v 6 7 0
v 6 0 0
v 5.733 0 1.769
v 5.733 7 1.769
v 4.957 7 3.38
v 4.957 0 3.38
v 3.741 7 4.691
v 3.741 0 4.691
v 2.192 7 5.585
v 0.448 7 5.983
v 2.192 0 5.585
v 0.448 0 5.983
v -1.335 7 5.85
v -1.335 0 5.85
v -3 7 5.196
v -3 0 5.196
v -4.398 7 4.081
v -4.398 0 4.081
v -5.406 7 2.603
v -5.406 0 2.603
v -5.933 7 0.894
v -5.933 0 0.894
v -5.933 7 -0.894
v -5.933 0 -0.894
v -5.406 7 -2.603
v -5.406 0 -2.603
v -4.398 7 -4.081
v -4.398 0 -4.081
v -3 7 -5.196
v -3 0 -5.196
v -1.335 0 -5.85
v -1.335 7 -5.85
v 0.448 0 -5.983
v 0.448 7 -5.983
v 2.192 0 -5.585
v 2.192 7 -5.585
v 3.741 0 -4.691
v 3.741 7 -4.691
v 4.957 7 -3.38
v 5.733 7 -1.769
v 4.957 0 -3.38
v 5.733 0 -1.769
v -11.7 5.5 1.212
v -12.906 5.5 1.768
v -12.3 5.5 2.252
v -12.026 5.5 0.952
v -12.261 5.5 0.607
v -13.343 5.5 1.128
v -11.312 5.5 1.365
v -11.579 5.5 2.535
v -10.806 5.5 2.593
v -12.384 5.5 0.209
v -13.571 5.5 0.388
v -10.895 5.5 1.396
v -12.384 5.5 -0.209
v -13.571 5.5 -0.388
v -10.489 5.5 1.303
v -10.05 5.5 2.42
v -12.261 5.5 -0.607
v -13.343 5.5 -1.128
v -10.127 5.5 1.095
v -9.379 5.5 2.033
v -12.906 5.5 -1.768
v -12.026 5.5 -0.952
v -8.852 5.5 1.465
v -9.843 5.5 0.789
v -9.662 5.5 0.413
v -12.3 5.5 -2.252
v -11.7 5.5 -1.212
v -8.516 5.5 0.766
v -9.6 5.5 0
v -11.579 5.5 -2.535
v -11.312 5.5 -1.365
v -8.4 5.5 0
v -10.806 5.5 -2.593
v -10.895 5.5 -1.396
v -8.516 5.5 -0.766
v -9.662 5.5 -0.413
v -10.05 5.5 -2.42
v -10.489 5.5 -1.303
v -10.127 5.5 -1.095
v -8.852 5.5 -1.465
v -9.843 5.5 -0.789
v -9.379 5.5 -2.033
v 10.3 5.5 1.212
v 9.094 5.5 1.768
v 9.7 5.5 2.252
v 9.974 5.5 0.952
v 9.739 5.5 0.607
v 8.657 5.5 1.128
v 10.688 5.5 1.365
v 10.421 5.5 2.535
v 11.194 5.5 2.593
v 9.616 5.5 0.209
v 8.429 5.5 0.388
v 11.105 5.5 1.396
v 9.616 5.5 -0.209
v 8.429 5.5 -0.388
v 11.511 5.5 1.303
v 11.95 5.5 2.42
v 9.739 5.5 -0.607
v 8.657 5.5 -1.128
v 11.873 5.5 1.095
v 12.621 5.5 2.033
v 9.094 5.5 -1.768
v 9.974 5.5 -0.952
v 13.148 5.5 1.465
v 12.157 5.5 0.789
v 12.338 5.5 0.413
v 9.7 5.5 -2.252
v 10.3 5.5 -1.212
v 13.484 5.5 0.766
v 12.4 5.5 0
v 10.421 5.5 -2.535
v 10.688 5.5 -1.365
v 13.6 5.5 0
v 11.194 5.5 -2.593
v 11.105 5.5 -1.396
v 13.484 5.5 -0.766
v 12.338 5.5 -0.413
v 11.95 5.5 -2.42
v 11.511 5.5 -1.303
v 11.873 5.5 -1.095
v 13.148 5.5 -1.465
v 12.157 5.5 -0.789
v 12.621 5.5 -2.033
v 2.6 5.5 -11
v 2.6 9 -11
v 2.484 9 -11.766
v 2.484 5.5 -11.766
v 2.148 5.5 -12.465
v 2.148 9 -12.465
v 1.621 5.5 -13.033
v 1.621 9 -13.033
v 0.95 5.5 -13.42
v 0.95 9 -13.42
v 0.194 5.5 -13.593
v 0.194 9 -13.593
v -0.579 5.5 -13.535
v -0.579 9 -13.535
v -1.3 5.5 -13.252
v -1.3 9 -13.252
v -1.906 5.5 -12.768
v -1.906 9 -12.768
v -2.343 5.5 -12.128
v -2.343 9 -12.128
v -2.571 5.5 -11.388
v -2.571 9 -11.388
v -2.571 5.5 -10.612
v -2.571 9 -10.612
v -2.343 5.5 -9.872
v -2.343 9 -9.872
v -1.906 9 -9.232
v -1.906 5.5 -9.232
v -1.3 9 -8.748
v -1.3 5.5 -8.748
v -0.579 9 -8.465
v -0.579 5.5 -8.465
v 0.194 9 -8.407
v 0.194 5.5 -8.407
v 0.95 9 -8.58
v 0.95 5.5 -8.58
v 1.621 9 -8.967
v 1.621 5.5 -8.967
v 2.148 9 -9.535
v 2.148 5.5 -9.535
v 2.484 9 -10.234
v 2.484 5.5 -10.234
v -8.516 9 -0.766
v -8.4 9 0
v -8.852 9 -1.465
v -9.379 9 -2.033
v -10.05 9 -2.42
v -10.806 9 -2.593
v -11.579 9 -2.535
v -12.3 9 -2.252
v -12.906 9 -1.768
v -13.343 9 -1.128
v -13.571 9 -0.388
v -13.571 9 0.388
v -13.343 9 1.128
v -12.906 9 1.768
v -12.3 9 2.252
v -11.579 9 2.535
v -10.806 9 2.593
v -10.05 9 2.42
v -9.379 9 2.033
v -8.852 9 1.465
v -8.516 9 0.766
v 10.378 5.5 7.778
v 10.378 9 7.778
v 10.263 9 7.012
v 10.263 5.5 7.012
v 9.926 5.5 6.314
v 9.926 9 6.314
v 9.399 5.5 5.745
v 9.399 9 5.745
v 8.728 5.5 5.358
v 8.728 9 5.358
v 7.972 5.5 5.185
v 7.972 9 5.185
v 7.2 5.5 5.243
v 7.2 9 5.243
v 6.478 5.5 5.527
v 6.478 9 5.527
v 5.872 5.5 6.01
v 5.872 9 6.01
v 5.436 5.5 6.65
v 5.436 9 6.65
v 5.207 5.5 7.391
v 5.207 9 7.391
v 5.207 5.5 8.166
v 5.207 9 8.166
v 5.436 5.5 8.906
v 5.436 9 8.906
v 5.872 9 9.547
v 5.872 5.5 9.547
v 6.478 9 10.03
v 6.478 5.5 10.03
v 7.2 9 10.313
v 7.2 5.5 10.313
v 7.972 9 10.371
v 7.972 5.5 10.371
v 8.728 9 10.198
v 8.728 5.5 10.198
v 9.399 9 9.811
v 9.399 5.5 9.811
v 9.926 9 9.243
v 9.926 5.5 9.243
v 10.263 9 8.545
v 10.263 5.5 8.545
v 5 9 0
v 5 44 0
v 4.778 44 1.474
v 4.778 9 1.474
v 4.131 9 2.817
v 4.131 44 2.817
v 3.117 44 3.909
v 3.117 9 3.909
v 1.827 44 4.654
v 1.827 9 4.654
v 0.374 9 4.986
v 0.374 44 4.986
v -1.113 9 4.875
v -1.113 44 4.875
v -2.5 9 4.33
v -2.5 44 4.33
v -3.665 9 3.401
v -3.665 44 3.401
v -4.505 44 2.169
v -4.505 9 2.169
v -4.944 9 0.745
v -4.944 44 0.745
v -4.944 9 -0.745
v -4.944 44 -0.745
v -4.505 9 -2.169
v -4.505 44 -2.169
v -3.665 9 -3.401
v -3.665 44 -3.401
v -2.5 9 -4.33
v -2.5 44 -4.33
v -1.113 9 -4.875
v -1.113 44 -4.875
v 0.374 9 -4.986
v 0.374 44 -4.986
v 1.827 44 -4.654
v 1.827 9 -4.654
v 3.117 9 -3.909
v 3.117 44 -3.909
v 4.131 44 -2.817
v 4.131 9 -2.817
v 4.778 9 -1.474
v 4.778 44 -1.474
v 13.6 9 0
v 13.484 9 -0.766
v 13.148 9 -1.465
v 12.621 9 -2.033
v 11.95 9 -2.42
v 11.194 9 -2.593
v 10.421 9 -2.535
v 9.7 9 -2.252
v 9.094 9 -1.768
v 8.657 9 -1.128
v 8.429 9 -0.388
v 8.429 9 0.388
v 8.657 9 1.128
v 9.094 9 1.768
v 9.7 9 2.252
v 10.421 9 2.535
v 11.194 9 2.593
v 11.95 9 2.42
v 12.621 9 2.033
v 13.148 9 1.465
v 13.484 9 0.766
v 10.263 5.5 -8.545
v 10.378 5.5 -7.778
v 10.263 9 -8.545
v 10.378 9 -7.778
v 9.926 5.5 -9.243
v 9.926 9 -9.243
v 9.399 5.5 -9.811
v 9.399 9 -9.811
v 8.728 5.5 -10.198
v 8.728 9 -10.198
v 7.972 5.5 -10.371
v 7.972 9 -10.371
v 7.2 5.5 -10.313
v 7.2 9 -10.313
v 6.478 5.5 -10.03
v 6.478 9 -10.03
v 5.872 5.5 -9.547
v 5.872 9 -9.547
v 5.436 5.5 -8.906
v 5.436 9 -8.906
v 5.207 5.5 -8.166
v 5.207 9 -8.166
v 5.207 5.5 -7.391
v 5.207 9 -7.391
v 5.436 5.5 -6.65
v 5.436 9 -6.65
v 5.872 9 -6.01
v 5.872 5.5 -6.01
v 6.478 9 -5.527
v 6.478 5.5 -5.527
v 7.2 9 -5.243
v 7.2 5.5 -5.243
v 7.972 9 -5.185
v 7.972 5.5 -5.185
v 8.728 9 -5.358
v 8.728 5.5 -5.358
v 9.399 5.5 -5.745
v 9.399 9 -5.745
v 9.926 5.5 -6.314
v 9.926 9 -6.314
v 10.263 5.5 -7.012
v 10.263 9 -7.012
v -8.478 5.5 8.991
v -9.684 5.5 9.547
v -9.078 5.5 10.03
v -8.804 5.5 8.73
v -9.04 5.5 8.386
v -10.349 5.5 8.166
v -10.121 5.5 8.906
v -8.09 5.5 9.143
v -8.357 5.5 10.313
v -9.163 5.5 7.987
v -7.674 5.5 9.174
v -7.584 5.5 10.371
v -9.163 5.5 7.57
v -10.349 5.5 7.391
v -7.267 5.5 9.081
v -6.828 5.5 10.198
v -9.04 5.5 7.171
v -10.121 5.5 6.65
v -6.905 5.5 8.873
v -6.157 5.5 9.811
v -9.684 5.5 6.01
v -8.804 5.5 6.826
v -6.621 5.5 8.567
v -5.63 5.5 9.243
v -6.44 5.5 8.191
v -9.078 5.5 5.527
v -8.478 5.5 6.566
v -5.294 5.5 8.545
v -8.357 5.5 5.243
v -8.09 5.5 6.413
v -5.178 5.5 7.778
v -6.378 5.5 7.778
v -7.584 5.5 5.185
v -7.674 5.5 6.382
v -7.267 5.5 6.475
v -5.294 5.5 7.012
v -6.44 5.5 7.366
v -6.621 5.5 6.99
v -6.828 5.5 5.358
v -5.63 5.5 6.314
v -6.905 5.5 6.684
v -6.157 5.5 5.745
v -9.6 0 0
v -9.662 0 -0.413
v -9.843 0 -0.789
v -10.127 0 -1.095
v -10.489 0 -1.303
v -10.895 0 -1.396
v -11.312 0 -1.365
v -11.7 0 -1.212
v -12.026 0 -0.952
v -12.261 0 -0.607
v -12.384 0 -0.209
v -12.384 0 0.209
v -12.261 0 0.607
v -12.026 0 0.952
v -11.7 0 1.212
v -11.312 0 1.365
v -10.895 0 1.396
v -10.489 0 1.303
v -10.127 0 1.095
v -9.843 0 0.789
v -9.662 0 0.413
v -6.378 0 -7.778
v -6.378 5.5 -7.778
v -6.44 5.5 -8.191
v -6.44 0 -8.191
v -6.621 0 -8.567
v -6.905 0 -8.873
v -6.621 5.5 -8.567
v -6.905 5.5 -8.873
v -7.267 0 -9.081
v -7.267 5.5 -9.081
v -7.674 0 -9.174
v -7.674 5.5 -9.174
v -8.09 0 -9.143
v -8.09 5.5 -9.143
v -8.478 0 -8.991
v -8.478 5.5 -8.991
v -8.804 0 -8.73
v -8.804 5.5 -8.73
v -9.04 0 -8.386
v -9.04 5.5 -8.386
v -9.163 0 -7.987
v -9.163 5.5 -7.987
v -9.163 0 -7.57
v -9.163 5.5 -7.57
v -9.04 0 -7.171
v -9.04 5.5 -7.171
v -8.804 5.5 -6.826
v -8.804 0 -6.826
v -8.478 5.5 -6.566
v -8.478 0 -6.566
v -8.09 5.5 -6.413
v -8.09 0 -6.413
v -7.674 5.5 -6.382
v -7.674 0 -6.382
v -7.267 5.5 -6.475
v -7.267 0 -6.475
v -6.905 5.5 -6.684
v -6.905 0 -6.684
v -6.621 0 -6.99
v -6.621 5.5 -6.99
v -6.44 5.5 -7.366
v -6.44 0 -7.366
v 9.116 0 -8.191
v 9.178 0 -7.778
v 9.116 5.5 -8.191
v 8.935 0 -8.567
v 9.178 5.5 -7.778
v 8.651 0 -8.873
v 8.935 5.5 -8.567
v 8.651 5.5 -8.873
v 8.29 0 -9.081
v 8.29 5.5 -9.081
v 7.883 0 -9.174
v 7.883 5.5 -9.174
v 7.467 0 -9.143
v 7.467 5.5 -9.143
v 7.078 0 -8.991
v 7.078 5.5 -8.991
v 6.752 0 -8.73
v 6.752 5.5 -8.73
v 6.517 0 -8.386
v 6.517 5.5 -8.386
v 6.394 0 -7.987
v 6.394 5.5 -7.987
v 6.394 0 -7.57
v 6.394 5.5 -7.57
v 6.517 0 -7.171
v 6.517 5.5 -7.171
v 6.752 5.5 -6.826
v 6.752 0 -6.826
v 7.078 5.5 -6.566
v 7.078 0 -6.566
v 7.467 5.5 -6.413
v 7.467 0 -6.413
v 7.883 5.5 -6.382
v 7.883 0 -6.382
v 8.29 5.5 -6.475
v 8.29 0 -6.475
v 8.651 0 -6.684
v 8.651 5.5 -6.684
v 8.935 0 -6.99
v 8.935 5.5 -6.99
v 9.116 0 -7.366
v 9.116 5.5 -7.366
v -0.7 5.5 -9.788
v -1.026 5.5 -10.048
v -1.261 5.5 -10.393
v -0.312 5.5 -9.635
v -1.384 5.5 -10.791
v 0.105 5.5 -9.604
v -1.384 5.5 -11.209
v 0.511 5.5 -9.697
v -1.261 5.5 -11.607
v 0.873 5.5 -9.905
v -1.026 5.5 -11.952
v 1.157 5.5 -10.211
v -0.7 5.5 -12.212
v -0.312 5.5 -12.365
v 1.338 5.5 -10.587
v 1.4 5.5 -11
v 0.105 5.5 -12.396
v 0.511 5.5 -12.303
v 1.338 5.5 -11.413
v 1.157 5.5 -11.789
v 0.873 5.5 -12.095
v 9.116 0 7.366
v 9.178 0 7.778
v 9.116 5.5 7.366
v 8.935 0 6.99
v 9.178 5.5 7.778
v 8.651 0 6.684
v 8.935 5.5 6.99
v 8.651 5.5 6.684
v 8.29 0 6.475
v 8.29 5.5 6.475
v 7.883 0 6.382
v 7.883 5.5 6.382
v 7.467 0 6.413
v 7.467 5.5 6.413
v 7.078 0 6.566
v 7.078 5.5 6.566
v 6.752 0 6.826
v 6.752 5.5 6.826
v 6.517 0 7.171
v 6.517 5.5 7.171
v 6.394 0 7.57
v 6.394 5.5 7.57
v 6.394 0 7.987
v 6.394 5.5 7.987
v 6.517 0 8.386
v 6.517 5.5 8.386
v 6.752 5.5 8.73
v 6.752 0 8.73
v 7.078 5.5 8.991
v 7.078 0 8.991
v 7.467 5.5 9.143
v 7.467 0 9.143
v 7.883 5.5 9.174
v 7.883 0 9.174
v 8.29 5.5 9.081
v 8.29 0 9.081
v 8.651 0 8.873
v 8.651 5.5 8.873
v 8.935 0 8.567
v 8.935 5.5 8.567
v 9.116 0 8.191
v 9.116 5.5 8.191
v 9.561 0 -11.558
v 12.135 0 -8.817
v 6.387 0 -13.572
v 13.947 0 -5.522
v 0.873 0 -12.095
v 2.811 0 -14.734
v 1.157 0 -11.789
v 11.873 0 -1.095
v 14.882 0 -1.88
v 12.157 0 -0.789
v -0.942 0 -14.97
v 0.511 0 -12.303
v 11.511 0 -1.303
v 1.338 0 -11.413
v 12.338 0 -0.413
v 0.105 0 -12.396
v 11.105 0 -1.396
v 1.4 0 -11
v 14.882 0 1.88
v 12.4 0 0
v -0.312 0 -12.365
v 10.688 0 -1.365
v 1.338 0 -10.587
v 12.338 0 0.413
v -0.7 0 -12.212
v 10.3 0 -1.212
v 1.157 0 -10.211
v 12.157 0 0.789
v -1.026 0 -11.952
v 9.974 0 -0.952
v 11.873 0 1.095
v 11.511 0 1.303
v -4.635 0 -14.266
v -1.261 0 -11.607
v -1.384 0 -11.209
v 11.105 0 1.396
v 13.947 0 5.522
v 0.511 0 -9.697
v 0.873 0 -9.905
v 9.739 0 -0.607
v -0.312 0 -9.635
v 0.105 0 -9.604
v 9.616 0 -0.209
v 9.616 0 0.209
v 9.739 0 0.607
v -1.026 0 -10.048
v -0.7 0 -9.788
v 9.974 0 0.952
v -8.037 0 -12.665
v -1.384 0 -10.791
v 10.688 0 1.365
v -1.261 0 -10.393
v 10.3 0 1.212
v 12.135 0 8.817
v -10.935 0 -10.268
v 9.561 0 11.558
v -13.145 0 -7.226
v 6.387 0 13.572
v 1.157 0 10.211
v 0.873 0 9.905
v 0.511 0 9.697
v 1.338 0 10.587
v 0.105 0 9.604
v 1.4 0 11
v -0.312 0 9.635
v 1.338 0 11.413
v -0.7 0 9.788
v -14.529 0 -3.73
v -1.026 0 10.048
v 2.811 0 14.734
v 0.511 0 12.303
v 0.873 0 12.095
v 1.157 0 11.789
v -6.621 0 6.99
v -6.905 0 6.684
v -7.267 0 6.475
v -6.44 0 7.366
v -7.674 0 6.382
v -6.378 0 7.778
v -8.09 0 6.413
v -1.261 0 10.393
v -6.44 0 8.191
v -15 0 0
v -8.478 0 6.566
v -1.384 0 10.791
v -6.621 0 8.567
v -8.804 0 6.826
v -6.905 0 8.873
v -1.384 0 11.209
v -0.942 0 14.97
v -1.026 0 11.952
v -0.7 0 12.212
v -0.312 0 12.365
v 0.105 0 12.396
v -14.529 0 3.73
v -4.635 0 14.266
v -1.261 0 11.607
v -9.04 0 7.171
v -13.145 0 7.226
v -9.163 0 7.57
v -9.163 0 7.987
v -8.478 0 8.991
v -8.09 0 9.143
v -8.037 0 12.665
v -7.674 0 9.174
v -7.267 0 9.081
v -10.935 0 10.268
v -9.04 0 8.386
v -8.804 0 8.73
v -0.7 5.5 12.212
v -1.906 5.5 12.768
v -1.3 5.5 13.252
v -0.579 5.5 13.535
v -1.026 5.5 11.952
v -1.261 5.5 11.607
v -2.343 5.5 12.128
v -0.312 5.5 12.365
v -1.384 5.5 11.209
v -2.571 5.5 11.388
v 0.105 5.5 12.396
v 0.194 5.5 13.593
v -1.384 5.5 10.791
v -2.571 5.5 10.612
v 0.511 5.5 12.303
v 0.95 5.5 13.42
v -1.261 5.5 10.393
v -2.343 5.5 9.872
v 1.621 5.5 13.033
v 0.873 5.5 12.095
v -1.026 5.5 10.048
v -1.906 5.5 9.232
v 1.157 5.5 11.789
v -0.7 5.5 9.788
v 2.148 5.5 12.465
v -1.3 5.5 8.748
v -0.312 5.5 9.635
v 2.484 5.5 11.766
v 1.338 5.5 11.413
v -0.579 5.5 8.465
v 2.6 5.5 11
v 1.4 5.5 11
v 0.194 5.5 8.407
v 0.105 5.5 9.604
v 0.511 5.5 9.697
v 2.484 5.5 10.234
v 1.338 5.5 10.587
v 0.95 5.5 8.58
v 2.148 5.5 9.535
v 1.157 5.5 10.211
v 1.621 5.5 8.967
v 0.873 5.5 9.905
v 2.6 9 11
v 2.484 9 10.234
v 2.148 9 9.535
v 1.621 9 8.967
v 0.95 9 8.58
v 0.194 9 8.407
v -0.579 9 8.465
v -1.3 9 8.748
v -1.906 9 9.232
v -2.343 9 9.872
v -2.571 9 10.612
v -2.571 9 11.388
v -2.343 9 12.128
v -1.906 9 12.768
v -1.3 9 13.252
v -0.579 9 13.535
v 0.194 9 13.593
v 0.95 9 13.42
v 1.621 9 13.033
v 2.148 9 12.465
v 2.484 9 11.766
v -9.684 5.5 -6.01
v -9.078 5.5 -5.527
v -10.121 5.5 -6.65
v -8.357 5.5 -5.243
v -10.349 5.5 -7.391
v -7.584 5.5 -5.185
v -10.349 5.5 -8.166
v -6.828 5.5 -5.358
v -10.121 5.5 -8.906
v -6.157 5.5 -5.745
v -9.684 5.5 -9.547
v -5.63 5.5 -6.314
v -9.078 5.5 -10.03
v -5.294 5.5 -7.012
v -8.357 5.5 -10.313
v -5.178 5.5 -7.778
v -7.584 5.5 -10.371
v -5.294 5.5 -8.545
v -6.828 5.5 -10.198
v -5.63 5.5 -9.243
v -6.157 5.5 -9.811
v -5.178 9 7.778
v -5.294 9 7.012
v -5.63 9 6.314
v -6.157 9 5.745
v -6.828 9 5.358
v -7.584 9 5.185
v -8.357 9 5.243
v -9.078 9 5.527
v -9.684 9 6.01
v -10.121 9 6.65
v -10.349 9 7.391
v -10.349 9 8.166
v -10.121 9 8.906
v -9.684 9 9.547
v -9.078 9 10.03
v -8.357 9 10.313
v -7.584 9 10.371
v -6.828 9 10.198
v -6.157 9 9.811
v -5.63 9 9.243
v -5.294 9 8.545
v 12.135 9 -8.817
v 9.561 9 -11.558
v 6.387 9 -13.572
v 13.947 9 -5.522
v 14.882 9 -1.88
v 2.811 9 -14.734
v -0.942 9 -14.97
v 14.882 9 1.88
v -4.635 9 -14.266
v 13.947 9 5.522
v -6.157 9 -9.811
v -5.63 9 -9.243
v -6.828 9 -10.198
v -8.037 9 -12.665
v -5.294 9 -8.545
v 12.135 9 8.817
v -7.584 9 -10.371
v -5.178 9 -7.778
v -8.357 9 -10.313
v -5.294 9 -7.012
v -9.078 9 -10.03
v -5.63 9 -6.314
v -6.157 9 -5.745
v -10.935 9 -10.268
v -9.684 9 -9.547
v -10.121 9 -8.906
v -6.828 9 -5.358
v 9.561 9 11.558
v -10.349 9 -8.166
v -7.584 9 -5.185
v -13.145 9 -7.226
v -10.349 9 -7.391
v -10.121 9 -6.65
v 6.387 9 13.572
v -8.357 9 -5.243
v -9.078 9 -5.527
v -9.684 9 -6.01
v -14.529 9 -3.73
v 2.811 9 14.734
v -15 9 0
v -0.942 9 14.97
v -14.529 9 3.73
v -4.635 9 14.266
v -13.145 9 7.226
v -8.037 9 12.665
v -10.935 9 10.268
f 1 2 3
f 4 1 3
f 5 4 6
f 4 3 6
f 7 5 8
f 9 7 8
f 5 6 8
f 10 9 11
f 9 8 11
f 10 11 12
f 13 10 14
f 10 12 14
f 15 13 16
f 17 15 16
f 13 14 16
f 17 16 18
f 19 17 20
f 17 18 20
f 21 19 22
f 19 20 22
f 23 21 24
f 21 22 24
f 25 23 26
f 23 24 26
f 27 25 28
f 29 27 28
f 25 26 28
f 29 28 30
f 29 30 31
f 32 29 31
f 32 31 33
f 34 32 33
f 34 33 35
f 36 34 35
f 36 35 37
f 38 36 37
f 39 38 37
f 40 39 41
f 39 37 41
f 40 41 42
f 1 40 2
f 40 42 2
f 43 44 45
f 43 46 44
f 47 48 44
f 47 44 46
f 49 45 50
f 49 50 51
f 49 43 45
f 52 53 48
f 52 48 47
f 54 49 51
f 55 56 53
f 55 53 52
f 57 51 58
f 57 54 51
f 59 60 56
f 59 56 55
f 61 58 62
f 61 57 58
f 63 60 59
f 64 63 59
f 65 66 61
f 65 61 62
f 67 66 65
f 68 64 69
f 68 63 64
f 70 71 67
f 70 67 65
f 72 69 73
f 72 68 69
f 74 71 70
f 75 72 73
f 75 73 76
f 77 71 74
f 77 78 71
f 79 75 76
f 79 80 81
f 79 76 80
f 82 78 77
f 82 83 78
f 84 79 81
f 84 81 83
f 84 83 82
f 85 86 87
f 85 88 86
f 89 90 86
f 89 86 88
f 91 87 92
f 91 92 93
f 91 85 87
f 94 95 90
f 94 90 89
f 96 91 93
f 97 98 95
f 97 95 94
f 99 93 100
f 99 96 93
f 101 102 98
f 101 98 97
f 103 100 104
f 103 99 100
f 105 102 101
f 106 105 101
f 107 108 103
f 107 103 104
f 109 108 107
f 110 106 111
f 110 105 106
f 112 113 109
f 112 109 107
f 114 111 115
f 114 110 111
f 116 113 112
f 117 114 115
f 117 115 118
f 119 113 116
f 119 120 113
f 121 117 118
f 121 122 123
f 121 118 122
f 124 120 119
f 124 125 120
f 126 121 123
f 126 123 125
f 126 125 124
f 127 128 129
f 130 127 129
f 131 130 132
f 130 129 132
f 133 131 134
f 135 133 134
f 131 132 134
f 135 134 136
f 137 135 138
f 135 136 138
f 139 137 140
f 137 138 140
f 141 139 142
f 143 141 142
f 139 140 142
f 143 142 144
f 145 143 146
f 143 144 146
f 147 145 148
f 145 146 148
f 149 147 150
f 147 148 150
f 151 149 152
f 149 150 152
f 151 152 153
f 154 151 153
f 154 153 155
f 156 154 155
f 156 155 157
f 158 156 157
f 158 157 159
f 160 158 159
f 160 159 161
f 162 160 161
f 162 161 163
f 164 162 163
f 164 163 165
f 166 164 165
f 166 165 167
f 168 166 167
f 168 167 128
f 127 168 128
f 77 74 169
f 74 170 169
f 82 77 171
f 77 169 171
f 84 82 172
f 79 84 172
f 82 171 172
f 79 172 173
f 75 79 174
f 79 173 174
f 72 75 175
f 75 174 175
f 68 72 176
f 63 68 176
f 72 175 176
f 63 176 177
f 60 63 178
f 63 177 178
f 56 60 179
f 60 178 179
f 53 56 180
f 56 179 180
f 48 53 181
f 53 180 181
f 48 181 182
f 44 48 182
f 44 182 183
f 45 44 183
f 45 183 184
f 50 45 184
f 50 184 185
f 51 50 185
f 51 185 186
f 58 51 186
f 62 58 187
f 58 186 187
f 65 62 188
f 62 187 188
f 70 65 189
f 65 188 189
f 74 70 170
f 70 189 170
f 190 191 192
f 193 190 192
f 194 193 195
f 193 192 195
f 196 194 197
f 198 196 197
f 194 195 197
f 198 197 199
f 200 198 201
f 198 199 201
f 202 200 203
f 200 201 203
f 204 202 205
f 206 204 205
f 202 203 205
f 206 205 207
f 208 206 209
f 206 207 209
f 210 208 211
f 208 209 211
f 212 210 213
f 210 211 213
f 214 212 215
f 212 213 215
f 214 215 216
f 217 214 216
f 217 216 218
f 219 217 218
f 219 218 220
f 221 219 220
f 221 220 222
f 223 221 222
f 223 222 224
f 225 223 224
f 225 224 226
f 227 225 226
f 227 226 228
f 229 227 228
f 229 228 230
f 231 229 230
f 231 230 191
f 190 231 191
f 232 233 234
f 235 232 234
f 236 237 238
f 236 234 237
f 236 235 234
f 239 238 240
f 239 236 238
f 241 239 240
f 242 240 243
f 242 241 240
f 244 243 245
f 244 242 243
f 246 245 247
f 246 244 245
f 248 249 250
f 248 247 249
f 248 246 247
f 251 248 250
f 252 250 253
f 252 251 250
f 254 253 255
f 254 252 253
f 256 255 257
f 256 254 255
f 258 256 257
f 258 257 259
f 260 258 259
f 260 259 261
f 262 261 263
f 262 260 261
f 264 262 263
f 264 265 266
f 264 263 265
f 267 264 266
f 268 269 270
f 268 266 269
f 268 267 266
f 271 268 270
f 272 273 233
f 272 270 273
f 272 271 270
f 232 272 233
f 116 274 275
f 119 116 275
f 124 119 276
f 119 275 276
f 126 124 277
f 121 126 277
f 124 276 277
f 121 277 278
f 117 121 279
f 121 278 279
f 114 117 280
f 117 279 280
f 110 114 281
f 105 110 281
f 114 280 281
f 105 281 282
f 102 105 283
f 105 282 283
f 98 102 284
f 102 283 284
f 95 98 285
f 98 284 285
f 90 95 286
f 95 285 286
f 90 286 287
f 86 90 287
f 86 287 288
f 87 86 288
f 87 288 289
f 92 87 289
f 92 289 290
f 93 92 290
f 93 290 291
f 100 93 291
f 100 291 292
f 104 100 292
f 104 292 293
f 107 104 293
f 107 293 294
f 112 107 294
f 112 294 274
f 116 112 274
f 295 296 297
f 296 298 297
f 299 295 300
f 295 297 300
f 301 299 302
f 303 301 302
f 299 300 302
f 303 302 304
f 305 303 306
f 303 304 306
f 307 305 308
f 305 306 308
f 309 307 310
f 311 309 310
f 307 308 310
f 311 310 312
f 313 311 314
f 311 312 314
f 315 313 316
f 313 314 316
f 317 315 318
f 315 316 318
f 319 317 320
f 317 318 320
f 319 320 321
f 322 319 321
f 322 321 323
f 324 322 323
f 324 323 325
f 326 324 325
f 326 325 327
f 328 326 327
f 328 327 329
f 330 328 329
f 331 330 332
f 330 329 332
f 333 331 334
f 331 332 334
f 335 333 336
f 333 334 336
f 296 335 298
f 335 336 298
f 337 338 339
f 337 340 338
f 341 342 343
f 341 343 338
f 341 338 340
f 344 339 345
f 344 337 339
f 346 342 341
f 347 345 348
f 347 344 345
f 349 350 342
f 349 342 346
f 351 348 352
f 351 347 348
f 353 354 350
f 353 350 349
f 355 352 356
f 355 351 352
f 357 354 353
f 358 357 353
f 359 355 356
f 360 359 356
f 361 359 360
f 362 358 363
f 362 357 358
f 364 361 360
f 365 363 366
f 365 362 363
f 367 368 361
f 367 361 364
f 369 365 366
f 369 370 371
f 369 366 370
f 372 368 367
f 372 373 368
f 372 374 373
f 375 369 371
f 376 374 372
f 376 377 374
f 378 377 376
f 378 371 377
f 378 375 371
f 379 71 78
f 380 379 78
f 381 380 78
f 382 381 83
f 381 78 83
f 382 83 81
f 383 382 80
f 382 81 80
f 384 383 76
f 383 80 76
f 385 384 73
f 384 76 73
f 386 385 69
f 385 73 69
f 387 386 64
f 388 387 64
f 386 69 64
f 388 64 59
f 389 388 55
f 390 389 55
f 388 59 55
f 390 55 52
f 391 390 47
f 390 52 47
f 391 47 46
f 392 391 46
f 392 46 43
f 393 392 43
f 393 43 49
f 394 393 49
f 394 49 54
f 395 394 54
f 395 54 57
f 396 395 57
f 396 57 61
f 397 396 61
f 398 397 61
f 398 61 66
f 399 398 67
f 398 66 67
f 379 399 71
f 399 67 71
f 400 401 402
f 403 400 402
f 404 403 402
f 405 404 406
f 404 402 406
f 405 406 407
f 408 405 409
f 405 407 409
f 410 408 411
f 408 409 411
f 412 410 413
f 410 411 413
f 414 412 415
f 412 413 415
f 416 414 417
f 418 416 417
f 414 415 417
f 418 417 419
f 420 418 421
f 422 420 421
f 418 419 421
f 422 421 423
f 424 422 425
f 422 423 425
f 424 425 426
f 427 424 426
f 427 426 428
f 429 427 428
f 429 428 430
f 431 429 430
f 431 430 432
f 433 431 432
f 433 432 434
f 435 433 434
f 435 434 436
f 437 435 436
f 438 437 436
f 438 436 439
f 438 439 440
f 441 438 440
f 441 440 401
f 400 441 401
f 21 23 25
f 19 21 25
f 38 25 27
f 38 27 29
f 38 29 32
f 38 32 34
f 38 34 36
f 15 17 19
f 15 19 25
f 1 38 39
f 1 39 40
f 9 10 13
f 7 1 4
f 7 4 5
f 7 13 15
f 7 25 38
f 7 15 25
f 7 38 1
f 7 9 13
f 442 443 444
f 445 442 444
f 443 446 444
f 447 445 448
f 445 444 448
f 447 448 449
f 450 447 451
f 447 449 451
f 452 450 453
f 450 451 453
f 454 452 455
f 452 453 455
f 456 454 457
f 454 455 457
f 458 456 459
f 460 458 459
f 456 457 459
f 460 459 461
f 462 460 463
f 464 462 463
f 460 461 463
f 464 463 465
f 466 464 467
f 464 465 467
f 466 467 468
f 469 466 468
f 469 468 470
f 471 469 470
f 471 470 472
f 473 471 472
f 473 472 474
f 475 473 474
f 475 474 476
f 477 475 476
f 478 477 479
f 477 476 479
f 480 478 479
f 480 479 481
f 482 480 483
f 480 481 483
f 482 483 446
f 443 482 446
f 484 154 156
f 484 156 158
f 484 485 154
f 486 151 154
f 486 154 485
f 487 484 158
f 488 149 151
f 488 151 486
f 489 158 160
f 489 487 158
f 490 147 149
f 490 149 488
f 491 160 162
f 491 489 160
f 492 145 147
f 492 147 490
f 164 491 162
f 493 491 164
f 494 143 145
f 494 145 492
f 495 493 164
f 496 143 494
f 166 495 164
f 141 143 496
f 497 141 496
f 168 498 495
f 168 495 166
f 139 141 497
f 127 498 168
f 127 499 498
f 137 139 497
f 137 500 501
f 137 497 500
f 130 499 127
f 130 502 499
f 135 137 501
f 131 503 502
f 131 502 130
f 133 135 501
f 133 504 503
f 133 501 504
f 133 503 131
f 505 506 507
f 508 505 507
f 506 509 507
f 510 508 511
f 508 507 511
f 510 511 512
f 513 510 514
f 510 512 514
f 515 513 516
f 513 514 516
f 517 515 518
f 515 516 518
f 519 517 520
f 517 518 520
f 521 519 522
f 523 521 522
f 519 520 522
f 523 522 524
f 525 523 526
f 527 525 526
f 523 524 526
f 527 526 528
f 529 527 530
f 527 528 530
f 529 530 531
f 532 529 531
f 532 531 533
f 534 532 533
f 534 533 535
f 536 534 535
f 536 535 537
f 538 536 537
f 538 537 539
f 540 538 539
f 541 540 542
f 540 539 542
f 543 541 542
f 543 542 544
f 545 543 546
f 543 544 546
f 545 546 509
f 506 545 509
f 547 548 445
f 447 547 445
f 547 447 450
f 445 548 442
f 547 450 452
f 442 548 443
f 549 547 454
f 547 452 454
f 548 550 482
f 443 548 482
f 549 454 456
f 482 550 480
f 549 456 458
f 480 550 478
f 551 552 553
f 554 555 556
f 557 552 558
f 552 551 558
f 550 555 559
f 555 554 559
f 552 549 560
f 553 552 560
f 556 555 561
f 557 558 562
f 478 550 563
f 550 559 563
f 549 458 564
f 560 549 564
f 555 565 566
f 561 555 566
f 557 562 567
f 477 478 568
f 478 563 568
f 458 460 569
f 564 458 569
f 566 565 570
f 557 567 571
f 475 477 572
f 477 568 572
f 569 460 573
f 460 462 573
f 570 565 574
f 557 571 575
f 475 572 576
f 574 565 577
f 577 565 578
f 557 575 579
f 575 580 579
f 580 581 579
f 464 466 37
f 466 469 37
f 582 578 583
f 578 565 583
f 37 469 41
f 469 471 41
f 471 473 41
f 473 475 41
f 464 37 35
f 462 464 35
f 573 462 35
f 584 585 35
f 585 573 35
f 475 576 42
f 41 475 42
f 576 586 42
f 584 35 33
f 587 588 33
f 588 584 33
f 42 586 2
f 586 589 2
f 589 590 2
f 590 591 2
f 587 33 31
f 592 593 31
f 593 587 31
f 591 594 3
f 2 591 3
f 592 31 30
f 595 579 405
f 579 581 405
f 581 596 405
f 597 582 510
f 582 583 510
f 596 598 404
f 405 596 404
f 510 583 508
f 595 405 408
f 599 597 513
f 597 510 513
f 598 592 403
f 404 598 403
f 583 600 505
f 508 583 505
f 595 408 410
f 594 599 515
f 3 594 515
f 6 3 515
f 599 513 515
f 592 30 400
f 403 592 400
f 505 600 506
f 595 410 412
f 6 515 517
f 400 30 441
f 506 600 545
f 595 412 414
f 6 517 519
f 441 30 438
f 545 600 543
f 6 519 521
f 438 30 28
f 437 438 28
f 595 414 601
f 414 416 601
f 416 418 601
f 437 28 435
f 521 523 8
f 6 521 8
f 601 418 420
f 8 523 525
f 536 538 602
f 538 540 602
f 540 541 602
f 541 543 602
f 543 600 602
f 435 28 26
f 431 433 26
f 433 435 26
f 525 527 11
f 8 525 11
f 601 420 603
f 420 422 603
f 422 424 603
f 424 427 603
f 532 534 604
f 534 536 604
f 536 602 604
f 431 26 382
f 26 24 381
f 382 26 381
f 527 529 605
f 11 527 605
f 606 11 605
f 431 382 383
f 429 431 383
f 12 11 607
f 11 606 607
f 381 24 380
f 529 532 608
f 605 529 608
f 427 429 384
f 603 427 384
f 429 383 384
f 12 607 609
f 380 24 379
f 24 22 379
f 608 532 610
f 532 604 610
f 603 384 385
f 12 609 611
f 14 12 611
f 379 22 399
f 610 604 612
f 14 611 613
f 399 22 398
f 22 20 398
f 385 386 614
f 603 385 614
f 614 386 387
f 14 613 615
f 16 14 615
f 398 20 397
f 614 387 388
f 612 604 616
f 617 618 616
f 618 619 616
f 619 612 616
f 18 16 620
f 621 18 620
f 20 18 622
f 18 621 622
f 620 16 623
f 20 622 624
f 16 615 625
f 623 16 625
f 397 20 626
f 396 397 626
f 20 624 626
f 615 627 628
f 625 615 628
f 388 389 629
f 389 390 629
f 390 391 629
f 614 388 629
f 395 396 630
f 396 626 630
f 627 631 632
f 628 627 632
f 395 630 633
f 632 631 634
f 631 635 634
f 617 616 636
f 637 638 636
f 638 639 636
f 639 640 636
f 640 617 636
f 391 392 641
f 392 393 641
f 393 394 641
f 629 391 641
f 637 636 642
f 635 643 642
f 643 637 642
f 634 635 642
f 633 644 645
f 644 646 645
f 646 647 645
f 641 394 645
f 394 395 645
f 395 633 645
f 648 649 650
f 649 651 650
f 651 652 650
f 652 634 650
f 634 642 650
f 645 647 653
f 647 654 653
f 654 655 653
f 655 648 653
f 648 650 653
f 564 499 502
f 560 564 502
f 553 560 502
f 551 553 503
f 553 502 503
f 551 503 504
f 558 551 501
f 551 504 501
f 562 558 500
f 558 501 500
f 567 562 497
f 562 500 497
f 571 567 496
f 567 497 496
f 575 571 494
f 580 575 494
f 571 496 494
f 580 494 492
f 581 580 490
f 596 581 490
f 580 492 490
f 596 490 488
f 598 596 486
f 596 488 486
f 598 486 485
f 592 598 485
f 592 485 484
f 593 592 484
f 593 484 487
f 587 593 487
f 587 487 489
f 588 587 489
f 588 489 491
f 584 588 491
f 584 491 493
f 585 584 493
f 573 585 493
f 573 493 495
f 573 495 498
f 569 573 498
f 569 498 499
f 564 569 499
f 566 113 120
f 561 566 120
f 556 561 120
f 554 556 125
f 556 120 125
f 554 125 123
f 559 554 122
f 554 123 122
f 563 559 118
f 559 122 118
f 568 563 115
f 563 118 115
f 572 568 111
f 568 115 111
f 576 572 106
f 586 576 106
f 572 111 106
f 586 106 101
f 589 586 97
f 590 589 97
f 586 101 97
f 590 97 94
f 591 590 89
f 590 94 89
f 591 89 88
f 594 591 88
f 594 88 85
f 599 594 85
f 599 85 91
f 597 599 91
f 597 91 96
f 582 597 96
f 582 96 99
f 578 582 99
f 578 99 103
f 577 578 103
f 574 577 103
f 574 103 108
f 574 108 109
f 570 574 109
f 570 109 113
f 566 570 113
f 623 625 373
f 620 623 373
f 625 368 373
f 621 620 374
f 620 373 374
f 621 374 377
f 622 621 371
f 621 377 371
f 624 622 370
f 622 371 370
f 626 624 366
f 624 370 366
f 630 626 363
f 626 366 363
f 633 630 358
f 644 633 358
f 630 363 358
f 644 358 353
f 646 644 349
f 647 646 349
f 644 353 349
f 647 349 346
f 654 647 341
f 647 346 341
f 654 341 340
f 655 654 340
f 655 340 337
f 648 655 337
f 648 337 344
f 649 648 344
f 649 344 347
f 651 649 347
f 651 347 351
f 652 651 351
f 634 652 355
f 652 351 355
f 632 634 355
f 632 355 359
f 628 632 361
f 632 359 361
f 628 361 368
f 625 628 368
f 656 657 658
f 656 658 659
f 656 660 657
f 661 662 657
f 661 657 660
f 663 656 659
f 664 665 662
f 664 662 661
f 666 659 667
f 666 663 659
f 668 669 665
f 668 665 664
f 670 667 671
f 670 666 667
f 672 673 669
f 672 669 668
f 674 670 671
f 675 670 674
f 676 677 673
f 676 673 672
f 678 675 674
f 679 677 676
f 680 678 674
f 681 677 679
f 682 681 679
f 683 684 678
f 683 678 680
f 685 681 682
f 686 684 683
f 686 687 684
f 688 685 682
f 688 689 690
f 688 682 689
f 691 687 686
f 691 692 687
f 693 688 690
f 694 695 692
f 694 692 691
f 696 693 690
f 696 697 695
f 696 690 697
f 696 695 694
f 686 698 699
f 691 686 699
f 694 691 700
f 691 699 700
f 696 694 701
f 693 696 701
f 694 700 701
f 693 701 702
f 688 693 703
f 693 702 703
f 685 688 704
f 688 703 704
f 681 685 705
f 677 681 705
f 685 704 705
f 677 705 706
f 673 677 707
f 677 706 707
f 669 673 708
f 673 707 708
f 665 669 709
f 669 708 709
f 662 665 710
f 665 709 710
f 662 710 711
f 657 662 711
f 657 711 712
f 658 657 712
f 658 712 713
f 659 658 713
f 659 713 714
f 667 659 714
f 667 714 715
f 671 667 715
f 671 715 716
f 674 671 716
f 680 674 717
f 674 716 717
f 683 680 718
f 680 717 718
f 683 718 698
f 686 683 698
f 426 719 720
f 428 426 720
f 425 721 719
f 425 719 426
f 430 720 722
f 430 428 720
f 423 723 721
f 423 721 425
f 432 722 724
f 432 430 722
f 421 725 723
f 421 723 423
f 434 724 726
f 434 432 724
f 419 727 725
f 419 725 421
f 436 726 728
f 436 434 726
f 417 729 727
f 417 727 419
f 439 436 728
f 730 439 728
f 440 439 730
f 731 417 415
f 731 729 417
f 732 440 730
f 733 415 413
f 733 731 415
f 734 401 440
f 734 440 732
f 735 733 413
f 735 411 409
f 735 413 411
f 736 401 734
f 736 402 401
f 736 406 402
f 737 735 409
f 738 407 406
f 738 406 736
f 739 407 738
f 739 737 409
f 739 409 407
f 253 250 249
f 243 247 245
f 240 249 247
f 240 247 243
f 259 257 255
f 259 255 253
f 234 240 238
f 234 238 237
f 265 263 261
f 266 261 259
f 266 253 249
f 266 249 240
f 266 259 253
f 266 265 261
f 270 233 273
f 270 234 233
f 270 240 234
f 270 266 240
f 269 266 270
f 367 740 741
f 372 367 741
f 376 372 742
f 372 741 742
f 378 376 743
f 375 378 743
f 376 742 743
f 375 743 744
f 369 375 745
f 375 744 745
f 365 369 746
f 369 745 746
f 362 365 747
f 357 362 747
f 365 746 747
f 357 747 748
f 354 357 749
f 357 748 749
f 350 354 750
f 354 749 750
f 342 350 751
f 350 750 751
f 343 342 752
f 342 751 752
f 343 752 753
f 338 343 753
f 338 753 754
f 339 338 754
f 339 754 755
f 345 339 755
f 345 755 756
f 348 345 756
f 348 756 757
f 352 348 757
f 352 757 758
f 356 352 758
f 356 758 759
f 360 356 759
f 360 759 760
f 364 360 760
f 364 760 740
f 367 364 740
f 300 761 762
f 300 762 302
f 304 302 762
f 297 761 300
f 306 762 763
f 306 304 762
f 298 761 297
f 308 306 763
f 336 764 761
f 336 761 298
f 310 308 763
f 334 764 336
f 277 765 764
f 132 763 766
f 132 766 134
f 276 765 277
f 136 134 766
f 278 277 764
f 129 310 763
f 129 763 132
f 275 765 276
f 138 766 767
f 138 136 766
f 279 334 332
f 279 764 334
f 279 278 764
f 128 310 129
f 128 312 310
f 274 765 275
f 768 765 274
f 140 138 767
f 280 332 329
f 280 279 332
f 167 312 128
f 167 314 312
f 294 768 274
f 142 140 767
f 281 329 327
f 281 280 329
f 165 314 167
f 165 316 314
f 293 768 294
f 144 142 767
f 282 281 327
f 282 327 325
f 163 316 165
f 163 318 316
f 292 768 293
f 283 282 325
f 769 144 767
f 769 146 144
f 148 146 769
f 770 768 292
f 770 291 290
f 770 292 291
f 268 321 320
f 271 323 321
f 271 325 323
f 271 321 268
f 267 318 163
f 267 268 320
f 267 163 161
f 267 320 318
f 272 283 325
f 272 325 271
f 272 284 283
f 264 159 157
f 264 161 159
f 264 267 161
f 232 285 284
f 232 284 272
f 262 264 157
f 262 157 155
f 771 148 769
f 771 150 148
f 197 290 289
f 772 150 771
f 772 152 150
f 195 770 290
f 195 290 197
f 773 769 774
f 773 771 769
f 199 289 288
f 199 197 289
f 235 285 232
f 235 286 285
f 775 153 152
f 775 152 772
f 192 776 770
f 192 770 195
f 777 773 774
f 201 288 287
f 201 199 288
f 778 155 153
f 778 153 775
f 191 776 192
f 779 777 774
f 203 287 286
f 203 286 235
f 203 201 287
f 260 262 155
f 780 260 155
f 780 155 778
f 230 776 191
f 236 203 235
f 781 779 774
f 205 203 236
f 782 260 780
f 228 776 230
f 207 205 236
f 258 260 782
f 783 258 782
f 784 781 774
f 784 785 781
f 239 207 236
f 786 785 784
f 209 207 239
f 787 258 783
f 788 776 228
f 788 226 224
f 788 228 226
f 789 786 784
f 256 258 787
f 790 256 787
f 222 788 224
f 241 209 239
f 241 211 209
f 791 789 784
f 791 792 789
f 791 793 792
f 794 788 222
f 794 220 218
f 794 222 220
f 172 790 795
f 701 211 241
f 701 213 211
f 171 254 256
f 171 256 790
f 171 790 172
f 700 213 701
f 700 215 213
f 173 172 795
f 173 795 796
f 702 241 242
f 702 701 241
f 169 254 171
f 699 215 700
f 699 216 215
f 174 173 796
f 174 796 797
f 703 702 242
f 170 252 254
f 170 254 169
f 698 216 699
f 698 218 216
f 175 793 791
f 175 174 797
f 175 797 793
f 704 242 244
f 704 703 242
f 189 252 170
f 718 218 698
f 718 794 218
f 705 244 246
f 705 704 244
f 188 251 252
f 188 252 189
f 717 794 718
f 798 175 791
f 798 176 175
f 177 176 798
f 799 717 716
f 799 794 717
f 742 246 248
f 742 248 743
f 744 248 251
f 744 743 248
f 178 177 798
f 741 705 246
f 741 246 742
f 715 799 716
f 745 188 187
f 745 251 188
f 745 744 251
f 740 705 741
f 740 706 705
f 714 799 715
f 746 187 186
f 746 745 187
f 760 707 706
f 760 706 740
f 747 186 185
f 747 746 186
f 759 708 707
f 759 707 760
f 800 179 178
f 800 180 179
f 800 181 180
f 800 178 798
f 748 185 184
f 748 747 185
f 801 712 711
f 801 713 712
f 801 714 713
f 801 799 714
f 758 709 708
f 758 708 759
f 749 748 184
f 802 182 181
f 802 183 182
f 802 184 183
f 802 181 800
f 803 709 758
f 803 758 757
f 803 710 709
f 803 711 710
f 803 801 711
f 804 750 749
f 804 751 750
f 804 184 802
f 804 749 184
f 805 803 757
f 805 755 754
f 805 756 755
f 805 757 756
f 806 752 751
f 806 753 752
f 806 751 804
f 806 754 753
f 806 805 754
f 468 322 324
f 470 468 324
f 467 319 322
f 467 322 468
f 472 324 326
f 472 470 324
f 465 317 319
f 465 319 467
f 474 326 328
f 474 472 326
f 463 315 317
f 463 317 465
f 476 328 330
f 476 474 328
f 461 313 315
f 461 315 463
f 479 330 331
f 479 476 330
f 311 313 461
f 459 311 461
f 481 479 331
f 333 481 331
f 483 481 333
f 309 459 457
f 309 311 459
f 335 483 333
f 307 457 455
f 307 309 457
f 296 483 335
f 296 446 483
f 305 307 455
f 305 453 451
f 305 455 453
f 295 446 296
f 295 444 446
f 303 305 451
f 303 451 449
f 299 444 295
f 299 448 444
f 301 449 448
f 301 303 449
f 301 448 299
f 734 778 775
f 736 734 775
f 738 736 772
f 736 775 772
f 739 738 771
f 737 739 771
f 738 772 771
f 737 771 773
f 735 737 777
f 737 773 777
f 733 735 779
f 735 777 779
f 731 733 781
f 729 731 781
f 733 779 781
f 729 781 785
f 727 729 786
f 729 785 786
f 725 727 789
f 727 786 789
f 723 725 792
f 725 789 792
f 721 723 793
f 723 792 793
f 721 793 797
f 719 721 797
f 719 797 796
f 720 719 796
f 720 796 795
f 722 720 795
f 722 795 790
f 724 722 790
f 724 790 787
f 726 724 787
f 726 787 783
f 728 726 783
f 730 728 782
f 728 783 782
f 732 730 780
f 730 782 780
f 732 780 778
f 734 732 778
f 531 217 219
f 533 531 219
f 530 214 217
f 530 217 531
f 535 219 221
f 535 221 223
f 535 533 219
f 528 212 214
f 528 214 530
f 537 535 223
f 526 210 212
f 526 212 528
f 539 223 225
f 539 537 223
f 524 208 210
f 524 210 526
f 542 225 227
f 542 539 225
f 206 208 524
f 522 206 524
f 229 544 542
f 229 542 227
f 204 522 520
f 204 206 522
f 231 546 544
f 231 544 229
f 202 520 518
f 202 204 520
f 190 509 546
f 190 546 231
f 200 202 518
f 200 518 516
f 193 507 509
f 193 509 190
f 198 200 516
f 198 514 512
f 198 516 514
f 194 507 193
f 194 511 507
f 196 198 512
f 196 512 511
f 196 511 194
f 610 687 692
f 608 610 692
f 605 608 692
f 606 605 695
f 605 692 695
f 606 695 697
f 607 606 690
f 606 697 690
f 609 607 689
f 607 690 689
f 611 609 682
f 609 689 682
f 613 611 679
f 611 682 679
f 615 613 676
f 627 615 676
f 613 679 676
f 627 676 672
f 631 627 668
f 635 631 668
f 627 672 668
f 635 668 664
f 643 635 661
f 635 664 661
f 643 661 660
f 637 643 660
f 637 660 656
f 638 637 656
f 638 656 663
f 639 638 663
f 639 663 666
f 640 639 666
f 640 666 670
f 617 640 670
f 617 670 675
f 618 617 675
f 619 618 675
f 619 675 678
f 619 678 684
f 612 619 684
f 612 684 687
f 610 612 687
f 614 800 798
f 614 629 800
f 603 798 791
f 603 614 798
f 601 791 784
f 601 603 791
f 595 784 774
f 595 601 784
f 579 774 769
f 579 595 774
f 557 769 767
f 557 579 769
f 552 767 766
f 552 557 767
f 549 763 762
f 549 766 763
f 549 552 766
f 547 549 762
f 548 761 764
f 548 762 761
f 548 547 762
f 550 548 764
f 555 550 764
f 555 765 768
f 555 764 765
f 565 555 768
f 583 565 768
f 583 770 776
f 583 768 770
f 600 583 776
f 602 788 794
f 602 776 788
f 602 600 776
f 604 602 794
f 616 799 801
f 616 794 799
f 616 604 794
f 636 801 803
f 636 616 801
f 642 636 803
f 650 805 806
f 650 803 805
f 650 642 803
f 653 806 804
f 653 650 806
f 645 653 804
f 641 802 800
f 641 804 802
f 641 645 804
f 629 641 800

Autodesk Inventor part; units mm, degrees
ref_plane "YZ Plane" through (0, 0, 0) normal (1, 0, 0) x (0, 1, 0)
ref_plane "XZ Plane" through (0, 0, 0) normal (0, 1, 0) x (-1, 0, 0)
ref_plane "XY Plane" through (0, 0, 0) normal (0, 0, 1) x (1, 0, 0)
sketch "Sketch1" plane through (0, 0, 0) normal (0, 1, 0) x (-1, 0, 0)
  circle A0 centre (0, 0) radius 15
  dimension "d0" = 30
extrude "Extrusion1" add sketch "Sketch1" along normal blind 9
sketch "Sketch3" plane through (0, 9, 0) normal (0, 1, 0) x (1, 0, 0)
  circle A0 centre (0, 0) radius 11 construction
  line L0 (0, 0) -> (0, 11) construction
  line L1 (0, 11) -> (7.7782, 7.7782) construction
  line L2 (7.7782, 7.7782) -> (11, 0) construction
  line L3 (11, 0) -> (7.7782, -7.7782) construction
  line L4 (7.7782, -7.7782) -> (0, -11) construction
  line L5 (0, -11) -> (-7.7782, -7.7782) construction
  line L6 (-7.7782, -7.7782) -> (-11, 0) construction
  line L7 (-11, 0) -> (-7.7782, 7.7782) construction
  line L8 (-7.7782, 7.7782) -> (0, 11) construction
  circle A1 centre (-11, 0) radius 1.4
  circle A2 centre (-7.7782, 7.7782) radius 1.4
  circle A3 centre (-7.7782, -7.7782) radius 1.4
  circle A4 centre (0, -11) radius 1.4
  circle A5 centre (7.7782, -7.7782) radius 1.4
  circle A6 centre (11, 0) radius 1.4
  circle A7 centre (7.7782, 7.7782) radius 1.4
  circle A8 centre (0, 11) radius 1.4
  dimension "d12" = 22
  dimension "d13" = 2.8
  dimension "d14" = 2.8
  dimension "d15" = 2.8
  dimension "d16" = 2.8
  dimension "d17" = 2.8
  dimension "d18" = 2.8
  dimension "d19" = 2.8
  dimension "d20" = 2.8
extrude "Extrusion3" cut sketch "Sketch3" against normal up to next
sketch "Sketch4" plane through (0, 9, 0) normal (0, 1, 0) x (1, 0, 0)
  circle A0 centre (-11, 0) radius 1.4 construction
  circle A1 centre (0, 0) radius 11 construction
  line L0 (0, 0) -> (-11, 0) construction
  line L1 (-11, 0) -> (-7.7782, 7.7782) construction
  line L2 (-7.7782, 7.7782) -> (0, 11) construction
  line L3 (0, 11) -> (7.7782, 7.7782) construction
  line L4 (7.7782, 7.7782) -> (11, 0) construction
  line L5 (11, 0) -> (7.7782, -7.7782) construction
  line L6 (7.7782, -7.7782) -> (0, -11) construction
  line L7 (0, -11) -> (-7.7782, -7.7782) construction
  line L8 (-7.7782, -7.7782) -> (-11, 0) construction
  circle A2 centre (-11, 0) radius 2.6
  circle A3 centre (-7.7782, 7.7782) radius 1.4 projected
  circle A4 centre (-7.7782, 7.7782) radius 2.6
  circle A5 centre (0, 11) radius 2.6
  circle A6 centre (7.7782, 7.7782) radius 2.6
  circle A7 centre (11, 0) radius 2.6
  circle A8 centre (7.7782, -7.7782) radius 1.4 projected
  circle A9 centre (7.7782, -7.7782) radius 2.6
  circle A10 centre (0, -11) radius 1.4 projected
  circle A11 centre (0, -11) radius 2.6
  circle A12 centre (-7.7782, -7.7782) radius 2.6
  dimension "d23" = 5.2
  dimension "d24" = 5.2
  dimension "d25" = 5.2
  dimension "d26" = 5.2
  dimension "d27" = 5.2
  dimension "d28" = 5.2
  dimension "d29" = 5.2
  dimension "d30" = 5.2
extrude "Extrusion4" cut sketch "Sketch4" against normal blind 3.5
sketch "Sketch5" plane through (0, 0, 0) normal (0, -1, 0) x (1, 0, 0)
  circle A0 centre (0, 0) radius 6
  dimension "d33" = 12
extrude "Extrusion5" cut sketch "Sketch5" against normal blind 7
sketch "Skizze6" plane through (0, 9, 0) normal (0, 1, 0) x (1, 0, 0)
  circle A0 centre (0, 0) radius 6 projected
  circle A1 centre (0, 0) radius 5
  dimension "d36" = 10
extrude "Extrusion6" add sketch "Skizze6" along normal blind 35 contours A1
properties part number "motorhorn_zu_ftsensor"
